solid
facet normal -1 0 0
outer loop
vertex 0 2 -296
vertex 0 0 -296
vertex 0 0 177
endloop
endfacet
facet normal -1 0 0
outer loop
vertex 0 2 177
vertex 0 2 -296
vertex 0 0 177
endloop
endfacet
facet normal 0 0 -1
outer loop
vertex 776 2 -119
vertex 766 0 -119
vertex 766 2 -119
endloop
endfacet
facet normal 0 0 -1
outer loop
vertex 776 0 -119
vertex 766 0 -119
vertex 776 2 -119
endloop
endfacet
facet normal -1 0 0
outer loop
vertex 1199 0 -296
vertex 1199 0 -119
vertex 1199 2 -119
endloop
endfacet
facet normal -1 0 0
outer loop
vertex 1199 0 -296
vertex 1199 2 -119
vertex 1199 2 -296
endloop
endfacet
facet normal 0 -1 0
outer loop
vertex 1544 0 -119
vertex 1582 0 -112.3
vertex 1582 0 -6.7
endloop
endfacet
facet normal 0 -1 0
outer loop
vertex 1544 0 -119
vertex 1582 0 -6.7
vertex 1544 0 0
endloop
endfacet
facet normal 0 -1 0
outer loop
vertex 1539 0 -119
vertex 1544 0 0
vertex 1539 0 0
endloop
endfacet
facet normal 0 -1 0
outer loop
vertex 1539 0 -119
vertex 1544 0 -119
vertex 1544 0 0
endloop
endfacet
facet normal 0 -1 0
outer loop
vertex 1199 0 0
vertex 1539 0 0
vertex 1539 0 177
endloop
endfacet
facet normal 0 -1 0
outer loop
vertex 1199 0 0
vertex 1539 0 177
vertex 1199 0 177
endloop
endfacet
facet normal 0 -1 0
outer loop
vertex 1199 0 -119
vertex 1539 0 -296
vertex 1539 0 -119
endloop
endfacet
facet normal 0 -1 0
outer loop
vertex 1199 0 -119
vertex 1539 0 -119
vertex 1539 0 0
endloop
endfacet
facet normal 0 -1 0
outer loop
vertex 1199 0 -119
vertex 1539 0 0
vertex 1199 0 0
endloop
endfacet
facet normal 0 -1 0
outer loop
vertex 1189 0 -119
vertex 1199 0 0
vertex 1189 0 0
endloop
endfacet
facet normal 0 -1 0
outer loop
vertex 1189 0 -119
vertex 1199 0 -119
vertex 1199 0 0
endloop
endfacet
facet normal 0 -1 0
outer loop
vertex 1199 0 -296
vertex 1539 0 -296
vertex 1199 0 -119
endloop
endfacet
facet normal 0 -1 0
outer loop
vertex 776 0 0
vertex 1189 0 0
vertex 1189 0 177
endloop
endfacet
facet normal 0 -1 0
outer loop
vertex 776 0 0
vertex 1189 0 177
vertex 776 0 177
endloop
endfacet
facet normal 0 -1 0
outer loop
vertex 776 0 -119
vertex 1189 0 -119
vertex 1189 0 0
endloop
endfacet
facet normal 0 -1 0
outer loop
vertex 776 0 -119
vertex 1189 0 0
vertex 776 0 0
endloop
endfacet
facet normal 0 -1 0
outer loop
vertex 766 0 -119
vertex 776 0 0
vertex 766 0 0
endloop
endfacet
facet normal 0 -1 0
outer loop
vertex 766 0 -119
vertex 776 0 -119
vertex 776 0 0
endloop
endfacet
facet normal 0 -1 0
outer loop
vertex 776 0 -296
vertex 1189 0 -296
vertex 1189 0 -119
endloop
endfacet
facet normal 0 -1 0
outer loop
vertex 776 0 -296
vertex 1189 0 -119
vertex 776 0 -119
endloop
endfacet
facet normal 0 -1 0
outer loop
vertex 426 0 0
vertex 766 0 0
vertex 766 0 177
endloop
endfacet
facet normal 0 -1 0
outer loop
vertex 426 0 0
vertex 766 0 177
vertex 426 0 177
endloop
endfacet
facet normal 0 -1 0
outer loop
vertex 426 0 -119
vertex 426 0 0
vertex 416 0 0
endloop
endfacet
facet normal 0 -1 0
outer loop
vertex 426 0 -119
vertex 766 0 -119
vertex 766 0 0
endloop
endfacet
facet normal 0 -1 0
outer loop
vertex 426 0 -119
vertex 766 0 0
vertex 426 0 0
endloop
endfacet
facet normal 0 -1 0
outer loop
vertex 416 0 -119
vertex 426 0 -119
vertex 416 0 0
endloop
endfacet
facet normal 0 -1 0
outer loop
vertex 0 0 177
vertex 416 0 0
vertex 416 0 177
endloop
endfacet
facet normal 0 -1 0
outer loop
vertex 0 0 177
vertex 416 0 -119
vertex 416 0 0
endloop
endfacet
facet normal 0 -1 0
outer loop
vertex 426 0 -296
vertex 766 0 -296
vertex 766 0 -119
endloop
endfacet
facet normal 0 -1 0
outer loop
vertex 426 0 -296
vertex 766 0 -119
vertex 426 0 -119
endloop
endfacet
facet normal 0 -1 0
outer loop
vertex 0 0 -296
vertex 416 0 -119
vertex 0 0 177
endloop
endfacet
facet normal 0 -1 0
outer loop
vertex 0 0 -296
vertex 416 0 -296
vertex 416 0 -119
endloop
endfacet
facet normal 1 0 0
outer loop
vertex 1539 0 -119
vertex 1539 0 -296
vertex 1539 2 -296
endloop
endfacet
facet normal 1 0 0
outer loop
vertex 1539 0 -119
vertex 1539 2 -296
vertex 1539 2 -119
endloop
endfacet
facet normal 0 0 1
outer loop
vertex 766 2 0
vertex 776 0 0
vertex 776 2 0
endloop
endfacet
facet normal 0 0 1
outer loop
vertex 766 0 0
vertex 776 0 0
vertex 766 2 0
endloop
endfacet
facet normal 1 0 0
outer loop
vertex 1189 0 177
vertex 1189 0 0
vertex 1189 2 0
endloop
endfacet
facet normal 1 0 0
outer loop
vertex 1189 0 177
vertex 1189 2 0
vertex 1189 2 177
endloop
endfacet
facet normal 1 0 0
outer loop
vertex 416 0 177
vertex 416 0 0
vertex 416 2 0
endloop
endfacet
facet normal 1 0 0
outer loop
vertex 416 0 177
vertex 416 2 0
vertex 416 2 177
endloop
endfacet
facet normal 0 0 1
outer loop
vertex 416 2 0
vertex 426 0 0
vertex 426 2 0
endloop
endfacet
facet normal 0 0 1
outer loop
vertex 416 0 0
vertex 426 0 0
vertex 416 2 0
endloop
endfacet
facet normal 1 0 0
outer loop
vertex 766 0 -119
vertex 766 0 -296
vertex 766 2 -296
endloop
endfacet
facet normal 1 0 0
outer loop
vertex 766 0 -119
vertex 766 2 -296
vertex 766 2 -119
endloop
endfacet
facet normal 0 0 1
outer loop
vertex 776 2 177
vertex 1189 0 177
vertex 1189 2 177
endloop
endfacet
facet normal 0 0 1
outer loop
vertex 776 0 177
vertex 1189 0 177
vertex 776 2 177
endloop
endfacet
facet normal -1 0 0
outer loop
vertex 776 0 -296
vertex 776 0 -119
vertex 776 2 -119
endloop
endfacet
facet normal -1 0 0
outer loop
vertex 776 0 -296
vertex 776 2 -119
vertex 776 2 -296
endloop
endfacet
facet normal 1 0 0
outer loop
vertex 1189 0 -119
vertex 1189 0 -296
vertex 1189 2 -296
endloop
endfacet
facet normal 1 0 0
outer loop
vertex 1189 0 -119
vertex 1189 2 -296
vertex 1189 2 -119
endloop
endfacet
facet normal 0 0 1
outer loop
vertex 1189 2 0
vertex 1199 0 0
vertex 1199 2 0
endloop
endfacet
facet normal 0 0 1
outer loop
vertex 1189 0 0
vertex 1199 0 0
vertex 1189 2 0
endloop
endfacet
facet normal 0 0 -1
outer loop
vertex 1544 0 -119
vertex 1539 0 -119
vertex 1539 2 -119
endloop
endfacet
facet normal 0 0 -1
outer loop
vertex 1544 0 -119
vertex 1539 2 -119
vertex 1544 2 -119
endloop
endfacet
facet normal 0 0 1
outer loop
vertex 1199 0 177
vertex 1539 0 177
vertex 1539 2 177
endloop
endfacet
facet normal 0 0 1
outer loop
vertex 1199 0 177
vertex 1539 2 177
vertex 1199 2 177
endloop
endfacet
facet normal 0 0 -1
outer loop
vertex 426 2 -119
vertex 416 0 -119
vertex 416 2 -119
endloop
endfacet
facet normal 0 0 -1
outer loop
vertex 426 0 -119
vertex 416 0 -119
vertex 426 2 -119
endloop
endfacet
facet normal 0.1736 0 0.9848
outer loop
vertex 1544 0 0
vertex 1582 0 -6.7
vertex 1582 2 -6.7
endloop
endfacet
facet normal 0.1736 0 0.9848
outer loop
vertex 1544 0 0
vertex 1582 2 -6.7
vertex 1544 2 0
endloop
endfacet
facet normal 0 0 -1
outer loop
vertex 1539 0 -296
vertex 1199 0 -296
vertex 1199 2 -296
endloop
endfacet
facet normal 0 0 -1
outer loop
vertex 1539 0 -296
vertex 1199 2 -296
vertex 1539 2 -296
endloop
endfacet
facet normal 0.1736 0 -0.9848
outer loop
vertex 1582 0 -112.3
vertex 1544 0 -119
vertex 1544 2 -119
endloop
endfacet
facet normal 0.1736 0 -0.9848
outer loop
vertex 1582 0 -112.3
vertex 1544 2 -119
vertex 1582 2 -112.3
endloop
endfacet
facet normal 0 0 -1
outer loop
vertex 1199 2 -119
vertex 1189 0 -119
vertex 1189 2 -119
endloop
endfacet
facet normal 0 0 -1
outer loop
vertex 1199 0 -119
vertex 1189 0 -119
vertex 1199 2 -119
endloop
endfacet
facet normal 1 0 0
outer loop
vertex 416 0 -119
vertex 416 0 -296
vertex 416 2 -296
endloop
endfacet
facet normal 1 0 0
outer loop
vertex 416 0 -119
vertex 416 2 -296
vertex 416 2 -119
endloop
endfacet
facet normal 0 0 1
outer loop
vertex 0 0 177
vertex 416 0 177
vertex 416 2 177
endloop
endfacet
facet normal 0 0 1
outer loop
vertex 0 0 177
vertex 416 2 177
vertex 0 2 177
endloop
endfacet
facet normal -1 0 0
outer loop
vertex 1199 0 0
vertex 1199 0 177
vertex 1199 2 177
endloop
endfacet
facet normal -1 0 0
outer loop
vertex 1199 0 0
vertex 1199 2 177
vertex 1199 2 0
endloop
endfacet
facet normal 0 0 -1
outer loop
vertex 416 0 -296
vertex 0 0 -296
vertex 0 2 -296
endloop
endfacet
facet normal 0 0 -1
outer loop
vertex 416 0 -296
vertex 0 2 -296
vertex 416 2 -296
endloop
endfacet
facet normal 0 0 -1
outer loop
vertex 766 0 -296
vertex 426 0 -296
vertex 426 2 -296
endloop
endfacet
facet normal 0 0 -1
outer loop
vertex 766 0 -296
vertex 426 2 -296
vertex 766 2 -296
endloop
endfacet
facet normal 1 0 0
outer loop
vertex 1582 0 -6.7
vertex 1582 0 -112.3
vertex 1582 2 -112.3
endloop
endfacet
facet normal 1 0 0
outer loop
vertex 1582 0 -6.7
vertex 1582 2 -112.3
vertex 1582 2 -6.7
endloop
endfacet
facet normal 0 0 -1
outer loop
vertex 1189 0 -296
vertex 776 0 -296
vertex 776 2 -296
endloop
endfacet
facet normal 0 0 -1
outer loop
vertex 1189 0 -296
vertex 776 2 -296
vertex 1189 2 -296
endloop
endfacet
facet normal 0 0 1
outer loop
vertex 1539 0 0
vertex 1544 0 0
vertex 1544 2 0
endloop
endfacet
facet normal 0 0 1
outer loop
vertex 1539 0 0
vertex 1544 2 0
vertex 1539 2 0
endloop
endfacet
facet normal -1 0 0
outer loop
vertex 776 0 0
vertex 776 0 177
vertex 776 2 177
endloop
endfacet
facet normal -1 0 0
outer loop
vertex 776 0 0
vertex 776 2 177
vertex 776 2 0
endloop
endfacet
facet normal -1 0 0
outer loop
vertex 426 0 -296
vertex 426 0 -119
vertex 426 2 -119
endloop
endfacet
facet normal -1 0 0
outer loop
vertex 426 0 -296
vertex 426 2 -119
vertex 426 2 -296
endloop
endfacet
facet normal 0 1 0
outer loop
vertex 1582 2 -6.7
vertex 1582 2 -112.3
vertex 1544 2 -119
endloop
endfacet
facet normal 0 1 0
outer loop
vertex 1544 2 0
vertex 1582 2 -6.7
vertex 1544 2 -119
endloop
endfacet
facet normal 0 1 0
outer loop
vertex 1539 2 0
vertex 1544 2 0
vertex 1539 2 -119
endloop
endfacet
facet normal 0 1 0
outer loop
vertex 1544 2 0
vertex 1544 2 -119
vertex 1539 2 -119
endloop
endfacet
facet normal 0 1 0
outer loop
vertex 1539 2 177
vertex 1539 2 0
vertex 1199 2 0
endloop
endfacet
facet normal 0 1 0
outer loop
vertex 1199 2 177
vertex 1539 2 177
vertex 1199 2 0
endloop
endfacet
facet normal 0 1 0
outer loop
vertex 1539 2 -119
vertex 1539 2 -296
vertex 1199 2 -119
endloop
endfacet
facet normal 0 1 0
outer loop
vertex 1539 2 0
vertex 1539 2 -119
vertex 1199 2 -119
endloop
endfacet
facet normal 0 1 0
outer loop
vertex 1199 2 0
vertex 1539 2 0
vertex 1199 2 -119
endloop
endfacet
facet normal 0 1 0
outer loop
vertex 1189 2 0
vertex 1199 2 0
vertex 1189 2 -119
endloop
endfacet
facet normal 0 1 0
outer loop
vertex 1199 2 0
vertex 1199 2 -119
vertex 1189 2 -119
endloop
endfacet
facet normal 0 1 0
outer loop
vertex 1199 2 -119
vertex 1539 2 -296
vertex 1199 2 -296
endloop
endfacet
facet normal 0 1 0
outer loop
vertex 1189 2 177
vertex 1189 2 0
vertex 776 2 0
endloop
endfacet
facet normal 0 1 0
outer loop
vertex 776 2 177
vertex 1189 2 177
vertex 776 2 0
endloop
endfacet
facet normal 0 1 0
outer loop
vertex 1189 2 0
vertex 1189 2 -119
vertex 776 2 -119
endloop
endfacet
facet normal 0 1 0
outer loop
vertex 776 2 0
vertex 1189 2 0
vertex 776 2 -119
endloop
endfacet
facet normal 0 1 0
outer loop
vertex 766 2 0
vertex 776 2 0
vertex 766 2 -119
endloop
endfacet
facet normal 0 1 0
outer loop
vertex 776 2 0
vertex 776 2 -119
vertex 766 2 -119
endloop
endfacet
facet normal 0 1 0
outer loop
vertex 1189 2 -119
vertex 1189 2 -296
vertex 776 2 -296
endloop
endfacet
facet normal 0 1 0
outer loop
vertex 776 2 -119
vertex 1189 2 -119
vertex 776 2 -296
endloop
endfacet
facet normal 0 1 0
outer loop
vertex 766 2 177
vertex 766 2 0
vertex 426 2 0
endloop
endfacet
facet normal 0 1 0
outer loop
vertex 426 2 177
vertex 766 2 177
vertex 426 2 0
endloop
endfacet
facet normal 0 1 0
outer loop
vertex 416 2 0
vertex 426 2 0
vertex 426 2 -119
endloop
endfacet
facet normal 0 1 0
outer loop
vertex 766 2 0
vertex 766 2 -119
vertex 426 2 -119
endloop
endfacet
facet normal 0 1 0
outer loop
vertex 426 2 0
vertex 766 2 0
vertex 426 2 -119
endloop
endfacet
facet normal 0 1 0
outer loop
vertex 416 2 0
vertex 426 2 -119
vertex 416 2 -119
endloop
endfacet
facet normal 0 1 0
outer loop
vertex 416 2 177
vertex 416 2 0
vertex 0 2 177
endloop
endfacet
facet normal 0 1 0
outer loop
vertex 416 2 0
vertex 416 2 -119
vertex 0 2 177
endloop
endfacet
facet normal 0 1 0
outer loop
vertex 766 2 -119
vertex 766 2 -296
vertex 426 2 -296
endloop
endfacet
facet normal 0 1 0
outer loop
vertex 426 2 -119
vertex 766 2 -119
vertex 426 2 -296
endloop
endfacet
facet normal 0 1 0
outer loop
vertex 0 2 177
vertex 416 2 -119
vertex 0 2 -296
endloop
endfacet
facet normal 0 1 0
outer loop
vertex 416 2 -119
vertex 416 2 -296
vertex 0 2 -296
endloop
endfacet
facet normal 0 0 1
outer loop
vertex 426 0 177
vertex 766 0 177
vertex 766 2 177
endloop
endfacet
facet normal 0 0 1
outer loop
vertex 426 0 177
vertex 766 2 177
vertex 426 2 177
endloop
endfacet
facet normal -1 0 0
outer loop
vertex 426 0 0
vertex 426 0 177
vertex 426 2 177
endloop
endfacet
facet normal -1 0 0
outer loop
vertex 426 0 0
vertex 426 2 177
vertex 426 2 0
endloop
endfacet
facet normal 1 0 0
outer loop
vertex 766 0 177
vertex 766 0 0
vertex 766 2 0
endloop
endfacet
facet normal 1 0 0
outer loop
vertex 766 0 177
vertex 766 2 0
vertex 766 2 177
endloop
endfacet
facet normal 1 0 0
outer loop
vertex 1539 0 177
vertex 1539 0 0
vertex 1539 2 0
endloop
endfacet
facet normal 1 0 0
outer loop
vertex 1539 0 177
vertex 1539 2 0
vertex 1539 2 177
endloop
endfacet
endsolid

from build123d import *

# Parameters (mm, degrees)
BOSS_EXTRUDE1_DEPTH = 2


with BuildPart() as part:
    # Sketch1 → Boss-Extrude1 (new body)
    with BuildSketch(Plane(origin=(0, 0, 0), x_dir=(1, 0, 0), z_dir=(0, 1, 0))):
        Polygon((0, 0), (0, 296), (416, 296), (416, 119), (426, 119), (426, 296), (766, 296), (766, 119), (776, 119), (776, 296), (1189, 296), (1189, 119), (1199, 119), (1199, 296), (1539, 296), (1539, 119), (1544, 119), (1582, 112.299574733), (1582, 6.700425267), (1544, 0), (1539, 0), (1539, -177), (1199, -177), (1199, 0), (1189, 0), (1189, -177), (776, -177), (776, 0), (766, 0), (766, -177), (426, -177), (426, 0), (416, 0), (416, -177), (0, -177), align=None)
    extrude(amount=BOSS_EXTRUDE1_DEPTH)


solid = part.part
